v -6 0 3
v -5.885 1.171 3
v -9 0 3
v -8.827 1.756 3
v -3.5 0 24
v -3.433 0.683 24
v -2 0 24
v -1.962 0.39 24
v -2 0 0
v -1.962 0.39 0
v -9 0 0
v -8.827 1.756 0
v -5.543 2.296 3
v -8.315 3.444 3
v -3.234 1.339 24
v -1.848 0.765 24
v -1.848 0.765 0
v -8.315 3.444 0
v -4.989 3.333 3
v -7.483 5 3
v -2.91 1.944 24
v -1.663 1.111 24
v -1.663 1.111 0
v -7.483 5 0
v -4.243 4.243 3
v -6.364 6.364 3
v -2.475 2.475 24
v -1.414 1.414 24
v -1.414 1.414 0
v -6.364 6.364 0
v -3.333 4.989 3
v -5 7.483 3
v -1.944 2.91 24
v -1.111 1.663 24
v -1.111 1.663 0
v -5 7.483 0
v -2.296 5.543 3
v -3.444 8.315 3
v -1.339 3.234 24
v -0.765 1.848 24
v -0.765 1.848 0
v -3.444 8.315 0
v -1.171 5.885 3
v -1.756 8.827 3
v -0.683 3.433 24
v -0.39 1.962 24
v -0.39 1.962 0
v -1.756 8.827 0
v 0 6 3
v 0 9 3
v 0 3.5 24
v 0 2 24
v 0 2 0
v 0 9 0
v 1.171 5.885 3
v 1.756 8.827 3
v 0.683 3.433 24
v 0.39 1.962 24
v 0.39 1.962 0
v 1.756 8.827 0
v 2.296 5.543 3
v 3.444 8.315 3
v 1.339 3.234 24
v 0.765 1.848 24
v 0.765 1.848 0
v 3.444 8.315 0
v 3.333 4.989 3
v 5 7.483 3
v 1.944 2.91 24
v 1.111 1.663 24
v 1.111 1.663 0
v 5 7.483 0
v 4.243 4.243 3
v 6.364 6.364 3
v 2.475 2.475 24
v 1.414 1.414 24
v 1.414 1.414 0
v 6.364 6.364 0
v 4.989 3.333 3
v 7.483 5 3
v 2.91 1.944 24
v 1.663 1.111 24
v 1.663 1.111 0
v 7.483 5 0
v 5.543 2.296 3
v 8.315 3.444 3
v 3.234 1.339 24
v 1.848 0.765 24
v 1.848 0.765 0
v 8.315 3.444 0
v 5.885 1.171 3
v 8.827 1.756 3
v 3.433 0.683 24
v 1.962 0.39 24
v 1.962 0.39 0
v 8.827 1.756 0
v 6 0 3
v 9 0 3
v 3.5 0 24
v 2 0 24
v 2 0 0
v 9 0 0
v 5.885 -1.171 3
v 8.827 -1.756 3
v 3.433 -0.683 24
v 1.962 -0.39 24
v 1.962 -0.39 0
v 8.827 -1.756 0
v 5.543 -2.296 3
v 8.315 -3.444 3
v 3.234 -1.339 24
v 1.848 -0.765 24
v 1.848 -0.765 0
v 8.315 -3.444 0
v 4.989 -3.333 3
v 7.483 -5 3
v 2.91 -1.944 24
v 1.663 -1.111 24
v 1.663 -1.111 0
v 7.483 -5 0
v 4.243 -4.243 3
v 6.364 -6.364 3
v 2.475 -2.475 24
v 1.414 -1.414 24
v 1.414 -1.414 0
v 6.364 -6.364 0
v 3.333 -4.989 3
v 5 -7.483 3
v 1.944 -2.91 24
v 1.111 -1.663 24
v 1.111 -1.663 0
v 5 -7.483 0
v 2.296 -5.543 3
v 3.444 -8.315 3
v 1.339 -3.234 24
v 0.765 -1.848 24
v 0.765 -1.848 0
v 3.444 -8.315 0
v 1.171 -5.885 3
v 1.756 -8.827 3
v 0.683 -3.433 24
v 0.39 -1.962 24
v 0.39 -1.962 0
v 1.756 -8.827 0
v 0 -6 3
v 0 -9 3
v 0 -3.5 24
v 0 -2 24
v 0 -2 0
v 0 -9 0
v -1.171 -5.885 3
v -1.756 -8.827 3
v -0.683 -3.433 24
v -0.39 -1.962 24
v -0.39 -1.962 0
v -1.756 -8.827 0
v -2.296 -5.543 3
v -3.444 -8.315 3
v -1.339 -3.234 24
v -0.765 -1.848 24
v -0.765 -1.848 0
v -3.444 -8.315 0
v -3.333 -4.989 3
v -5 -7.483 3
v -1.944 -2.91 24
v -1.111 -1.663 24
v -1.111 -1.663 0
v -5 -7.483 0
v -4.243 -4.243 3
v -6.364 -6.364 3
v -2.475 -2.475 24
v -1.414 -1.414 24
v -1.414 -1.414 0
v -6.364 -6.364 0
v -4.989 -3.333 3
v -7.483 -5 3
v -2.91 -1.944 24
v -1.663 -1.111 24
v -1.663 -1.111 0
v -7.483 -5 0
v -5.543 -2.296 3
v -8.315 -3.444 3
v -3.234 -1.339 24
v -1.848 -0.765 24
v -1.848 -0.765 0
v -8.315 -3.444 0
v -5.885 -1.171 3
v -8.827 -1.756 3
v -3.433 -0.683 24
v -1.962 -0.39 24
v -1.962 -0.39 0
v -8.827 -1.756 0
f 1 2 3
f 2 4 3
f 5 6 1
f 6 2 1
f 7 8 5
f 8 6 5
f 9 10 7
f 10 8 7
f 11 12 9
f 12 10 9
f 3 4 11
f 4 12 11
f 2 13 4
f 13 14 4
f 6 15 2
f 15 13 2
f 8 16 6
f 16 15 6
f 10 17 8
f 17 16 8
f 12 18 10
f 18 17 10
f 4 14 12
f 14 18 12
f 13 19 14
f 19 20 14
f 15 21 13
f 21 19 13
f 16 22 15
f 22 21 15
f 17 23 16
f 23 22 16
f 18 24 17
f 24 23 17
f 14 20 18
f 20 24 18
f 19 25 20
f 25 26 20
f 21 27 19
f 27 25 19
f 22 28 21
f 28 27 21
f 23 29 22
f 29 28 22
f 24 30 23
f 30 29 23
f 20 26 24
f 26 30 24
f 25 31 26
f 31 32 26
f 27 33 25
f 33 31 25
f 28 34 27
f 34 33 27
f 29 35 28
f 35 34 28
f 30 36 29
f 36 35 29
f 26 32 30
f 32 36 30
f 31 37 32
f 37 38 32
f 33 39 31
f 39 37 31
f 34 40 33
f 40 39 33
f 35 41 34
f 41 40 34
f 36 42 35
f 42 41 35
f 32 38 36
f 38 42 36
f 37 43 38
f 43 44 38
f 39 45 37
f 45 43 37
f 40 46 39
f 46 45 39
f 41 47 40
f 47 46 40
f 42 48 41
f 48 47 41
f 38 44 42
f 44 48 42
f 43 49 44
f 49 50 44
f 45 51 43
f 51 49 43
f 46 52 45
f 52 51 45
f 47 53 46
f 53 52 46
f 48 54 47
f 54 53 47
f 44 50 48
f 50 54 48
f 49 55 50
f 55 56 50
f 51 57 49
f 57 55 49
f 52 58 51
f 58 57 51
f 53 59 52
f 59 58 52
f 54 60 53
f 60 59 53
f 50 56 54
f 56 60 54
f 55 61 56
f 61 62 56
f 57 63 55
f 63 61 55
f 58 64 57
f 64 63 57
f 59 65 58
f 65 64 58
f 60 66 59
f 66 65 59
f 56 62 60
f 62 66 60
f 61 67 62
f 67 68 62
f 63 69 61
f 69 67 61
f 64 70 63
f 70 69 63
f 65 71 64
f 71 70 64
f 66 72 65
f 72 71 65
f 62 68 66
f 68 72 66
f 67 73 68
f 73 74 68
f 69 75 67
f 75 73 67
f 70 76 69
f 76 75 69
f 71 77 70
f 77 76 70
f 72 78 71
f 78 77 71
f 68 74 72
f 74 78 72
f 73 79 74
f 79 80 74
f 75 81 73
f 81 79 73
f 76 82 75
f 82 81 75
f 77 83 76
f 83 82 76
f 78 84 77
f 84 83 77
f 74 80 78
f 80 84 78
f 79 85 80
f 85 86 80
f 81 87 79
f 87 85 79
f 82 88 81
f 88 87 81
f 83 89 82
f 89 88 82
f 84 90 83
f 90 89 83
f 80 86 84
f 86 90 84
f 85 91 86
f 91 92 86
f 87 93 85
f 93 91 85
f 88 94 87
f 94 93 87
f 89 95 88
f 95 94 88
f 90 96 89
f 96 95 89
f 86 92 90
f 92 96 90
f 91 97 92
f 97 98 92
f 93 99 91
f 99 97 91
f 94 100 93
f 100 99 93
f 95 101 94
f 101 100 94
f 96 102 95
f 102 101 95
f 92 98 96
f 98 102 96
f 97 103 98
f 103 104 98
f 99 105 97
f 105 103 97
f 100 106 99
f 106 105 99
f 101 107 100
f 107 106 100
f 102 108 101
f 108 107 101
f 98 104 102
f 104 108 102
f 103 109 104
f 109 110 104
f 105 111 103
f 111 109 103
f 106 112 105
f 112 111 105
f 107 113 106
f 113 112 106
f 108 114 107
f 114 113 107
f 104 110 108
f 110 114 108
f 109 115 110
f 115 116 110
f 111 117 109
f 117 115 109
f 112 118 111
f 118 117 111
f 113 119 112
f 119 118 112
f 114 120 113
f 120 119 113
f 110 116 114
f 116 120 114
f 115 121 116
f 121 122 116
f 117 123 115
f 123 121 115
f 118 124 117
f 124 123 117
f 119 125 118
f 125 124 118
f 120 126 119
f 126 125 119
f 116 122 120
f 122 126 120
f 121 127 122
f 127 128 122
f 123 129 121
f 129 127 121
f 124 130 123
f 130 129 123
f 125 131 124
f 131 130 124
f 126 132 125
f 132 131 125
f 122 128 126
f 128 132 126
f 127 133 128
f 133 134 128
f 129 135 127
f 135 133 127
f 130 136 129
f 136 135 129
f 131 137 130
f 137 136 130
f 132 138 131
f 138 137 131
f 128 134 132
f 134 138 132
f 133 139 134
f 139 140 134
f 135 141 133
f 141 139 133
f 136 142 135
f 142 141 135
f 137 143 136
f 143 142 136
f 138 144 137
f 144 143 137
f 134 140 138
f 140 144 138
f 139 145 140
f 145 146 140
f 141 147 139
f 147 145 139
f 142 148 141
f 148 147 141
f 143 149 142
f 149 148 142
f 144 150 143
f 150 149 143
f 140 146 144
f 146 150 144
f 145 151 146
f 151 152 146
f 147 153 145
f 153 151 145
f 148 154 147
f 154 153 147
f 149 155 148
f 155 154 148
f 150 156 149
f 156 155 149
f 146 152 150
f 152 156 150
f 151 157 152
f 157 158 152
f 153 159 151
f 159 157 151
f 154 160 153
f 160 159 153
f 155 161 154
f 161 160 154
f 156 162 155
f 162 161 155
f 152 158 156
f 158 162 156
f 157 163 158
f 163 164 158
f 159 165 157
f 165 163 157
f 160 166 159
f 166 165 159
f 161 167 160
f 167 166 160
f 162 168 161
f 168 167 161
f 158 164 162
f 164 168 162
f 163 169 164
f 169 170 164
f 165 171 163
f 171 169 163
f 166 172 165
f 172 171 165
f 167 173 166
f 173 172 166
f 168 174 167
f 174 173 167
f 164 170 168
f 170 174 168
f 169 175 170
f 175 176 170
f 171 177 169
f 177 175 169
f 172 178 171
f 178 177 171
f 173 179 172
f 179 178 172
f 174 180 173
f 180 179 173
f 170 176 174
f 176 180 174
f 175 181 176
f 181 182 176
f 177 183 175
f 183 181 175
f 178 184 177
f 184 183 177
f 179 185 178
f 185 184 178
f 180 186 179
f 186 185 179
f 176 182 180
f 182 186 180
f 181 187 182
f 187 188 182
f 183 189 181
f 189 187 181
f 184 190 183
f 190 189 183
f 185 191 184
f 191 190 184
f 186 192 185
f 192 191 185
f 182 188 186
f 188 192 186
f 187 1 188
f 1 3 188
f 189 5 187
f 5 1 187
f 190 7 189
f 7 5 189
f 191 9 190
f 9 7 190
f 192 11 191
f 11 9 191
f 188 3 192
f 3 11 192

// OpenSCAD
$fn = 32;

// ----------------------------------------------------------------------
// Profiled standoff: conical spacer, 24 mm long, bore 4 mm
// ----------------------------------------------------------------------

// --- parameters (mm) ---
revolve_angle = 360;      // full turn around the Z axis
profile_points = 6;       // points of the closed outline

profile = [[2, 0], [9, 0], [9, 3], [6, 3], [3.5, 24], [2, 24]];  // single closed polygon, 6 points, counter clockwise

// --- the one profile operation ---
rotate_extrude(angle = revolve_angle) polygon(points = profile);
